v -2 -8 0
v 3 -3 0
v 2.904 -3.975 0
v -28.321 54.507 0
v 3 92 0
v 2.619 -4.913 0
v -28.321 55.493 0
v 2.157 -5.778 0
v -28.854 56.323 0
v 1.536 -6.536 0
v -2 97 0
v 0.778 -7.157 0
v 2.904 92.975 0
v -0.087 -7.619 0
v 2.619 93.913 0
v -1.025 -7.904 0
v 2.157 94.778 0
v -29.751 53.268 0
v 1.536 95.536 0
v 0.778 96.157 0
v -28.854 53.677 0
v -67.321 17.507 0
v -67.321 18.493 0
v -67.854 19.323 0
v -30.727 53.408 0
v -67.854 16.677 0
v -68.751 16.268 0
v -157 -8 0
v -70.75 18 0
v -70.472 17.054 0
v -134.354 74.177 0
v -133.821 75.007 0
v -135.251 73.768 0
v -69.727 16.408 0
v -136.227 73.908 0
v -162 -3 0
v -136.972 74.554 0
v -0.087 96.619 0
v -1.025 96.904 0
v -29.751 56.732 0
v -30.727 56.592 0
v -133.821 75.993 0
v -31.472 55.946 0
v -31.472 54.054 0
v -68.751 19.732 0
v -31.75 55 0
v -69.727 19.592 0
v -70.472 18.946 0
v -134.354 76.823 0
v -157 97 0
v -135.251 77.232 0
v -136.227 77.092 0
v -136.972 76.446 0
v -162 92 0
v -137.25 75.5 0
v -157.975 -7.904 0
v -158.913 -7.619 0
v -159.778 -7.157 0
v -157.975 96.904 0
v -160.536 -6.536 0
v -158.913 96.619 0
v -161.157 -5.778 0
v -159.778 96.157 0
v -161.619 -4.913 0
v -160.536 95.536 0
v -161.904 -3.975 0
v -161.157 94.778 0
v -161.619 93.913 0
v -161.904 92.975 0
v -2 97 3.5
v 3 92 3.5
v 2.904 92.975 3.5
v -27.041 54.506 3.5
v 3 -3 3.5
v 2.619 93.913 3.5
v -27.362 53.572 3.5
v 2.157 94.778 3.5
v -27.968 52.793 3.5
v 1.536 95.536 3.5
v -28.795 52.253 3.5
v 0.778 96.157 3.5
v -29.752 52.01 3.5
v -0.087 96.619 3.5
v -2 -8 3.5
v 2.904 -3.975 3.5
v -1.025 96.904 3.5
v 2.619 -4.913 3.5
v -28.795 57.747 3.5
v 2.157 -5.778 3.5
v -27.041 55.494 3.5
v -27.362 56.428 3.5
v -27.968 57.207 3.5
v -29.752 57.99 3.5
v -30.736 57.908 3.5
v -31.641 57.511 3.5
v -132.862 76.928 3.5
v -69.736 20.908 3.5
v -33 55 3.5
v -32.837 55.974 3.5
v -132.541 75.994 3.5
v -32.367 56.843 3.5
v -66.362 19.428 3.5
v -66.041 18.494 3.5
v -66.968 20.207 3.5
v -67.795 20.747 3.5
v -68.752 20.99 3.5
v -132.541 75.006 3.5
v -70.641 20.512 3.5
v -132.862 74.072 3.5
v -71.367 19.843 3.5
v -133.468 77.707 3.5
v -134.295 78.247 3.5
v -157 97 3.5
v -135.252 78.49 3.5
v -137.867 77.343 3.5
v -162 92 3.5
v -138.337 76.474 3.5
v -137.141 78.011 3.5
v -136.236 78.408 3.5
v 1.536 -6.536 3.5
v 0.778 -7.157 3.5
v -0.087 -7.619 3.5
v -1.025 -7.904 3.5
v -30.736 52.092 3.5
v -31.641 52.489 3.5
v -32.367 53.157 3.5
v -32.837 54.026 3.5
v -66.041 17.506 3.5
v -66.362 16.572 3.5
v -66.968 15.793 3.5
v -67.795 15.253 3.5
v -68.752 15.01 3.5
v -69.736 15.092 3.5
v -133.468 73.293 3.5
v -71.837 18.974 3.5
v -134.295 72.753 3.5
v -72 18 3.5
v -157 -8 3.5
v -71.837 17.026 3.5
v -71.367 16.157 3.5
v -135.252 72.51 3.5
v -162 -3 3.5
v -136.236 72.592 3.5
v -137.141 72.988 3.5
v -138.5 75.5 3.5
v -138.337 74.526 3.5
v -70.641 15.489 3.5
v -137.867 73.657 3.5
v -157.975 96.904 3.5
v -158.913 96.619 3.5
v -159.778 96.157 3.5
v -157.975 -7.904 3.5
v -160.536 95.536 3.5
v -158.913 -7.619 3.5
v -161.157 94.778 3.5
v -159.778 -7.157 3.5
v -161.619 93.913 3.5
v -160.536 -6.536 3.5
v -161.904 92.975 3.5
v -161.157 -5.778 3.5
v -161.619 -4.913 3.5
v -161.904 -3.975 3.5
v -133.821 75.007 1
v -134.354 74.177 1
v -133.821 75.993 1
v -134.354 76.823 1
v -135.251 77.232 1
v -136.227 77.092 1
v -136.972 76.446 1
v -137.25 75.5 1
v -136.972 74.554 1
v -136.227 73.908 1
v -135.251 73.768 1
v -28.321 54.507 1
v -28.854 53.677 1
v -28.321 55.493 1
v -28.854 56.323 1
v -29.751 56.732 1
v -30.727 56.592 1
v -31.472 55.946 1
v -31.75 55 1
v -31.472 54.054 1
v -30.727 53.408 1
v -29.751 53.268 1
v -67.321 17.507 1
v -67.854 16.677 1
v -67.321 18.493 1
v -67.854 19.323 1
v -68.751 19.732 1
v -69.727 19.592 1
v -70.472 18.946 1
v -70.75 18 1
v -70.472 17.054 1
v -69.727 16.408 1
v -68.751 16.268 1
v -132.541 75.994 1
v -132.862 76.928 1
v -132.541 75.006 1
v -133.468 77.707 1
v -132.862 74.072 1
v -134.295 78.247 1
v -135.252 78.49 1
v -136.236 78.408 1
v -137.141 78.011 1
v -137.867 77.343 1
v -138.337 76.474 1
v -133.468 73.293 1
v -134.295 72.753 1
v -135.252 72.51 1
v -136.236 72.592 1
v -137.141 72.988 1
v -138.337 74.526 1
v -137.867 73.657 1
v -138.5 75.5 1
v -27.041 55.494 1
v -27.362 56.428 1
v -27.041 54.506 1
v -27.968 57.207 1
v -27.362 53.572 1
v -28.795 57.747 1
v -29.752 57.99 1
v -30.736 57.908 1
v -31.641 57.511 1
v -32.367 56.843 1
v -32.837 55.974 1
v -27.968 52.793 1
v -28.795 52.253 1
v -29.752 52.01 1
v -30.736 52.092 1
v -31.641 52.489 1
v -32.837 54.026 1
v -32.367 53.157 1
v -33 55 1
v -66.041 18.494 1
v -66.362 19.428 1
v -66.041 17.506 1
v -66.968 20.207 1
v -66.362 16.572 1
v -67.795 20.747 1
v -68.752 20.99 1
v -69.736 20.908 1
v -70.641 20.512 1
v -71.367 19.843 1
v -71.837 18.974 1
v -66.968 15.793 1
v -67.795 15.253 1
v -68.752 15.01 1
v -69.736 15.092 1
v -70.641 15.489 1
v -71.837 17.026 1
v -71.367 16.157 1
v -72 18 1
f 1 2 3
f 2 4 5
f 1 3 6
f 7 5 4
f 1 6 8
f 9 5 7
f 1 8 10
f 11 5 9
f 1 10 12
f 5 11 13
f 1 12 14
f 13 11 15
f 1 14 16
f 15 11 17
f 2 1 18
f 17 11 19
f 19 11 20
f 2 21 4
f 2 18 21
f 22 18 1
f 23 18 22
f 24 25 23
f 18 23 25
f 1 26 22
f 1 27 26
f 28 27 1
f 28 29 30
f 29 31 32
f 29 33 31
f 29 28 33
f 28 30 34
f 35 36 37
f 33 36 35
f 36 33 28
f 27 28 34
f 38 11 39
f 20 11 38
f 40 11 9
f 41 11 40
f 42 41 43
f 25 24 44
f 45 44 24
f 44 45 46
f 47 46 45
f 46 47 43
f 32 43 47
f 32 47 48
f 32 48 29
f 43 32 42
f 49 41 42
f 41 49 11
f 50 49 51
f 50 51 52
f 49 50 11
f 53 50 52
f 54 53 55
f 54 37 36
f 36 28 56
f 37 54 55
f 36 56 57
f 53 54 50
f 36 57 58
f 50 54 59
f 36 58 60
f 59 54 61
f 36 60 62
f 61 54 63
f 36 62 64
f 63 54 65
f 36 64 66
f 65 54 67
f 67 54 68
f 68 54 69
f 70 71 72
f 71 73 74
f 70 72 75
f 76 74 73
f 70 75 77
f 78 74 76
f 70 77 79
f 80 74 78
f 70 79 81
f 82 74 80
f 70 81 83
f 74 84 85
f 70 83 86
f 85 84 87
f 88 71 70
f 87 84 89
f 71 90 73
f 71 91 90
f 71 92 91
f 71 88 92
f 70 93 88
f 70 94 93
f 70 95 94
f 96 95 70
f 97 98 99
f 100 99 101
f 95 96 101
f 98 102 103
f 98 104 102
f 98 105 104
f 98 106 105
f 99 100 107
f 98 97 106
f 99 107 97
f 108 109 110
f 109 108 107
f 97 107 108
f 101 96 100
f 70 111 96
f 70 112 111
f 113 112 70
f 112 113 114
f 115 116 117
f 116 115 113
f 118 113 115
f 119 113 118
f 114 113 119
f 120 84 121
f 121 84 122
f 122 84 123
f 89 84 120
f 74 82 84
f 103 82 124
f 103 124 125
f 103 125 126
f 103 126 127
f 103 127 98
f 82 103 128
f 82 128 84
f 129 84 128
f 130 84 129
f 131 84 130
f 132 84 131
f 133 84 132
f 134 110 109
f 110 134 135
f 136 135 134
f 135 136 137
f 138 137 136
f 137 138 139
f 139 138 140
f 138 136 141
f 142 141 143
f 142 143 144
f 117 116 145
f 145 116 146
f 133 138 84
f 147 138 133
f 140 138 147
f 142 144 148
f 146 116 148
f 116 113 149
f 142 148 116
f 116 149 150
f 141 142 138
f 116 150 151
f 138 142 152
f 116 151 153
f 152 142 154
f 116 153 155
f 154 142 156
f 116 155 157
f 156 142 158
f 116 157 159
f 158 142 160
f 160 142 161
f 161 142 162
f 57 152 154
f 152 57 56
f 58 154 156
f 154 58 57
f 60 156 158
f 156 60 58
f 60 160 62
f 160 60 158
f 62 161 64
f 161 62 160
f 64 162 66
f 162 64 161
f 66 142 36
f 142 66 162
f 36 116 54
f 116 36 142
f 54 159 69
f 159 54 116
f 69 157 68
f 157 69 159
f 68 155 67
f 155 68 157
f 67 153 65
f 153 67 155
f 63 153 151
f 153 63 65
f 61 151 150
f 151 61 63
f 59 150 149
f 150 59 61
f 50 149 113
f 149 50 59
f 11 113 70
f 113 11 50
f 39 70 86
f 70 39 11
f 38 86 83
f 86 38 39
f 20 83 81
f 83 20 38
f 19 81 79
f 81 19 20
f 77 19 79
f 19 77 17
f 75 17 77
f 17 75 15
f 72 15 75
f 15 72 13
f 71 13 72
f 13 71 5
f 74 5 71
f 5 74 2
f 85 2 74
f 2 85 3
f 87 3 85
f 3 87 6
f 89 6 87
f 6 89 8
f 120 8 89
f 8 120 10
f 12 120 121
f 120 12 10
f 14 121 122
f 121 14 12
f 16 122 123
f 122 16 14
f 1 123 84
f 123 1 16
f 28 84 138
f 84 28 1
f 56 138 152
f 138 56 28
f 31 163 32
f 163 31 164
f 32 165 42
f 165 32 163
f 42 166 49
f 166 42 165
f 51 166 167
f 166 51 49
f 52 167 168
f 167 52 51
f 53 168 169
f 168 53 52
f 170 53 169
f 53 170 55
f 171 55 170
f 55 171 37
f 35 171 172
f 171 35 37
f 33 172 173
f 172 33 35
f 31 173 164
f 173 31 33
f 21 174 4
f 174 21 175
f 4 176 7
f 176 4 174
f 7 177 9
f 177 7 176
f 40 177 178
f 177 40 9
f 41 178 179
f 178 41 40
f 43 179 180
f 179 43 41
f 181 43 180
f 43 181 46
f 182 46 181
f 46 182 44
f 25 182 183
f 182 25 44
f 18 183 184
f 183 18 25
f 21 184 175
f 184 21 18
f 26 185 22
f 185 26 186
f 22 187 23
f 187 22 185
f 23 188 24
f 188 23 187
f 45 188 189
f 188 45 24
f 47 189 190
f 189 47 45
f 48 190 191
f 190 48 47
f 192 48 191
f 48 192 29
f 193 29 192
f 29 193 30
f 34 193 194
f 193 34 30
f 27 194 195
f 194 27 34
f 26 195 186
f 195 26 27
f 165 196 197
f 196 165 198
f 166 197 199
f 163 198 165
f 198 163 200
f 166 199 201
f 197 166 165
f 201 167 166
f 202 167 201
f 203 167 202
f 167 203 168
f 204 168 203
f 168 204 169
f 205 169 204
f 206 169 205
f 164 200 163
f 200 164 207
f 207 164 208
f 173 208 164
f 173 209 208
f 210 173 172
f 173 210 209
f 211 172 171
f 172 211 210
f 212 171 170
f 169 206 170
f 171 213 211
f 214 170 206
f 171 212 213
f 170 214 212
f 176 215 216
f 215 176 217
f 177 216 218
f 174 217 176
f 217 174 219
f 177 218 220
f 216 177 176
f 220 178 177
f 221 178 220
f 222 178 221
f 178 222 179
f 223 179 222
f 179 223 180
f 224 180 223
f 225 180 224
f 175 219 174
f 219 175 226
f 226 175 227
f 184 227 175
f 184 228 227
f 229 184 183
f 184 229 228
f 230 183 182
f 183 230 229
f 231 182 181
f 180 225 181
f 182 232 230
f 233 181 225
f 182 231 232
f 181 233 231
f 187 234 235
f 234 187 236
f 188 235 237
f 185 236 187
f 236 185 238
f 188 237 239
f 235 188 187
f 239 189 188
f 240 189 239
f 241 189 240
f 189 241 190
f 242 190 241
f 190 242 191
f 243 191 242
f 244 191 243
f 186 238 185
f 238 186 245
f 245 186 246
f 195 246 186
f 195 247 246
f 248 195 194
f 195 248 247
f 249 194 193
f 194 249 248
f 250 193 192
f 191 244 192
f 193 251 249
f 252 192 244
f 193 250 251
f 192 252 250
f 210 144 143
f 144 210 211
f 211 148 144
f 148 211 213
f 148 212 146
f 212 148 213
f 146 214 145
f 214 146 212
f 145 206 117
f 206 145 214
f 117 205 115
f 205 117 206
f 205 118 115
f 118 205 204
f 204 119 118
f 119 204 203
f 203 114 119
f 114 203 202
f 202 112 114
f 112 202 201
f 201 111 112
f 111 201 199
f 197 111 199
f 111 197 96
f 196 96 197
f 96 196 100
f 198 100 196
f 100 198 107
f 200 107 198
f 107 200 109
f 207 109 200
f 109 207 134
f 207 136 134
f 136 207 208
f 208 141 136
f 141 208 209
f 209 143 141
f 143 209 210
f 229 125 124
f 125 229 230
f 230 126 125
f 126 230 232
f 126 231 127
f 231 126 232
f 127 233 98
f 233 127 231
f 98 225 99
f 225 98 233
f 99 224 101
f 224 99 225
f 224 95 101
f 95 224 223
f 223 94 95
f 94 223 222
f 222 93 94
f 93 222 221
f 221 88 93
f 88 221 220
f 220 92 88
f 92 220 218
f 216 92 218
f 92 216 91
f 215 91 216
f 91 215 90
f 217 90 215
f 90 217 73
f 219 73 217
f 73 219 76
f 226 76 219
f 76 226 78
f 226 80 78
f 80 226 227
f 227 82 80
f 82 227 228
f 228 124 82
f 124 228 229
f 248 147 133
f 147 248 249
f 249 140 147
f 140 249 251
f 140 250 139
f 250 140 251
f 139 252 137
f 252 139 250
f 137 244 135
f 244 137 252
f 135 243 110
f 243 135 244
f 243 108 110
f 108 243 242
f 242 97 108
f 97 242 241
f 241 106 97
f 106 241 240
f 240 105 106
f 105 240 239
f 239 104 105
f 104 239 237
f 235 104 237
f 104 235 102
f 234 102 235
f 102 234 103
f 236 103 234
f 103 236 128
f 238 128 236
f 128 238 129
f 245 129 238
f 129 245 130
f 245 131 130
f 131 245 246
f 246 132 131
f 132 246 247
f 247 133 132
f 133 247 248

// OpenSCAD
$fa=1;$fs=1;

module rsq(w=50,h=50,r=5){
	translate([r,r])minkowski(){
		square([w-r-r,h-r-r]);
		circle(r);
	}
}

module nejiana(d=6.6){
	translate([30,55]){
		circle(d=d);
		translate([105.5,20.5])circle(d=d);
		translate([39,-37])circle(d=d);
	}
}
module conn(){
		translate([7,56])square([9,7]);
}

module main(c=0){
difference(){
	linear_extrude(3.5)difference(){
		translate([-3,-8])rsq(165,105,5);
		nejiana(3.5);
		if(c)conn();
	}
	translate([0,0,1])linear_extrude(3)nejiana(d=6);
}
}


scale([-1,1,1])main();
